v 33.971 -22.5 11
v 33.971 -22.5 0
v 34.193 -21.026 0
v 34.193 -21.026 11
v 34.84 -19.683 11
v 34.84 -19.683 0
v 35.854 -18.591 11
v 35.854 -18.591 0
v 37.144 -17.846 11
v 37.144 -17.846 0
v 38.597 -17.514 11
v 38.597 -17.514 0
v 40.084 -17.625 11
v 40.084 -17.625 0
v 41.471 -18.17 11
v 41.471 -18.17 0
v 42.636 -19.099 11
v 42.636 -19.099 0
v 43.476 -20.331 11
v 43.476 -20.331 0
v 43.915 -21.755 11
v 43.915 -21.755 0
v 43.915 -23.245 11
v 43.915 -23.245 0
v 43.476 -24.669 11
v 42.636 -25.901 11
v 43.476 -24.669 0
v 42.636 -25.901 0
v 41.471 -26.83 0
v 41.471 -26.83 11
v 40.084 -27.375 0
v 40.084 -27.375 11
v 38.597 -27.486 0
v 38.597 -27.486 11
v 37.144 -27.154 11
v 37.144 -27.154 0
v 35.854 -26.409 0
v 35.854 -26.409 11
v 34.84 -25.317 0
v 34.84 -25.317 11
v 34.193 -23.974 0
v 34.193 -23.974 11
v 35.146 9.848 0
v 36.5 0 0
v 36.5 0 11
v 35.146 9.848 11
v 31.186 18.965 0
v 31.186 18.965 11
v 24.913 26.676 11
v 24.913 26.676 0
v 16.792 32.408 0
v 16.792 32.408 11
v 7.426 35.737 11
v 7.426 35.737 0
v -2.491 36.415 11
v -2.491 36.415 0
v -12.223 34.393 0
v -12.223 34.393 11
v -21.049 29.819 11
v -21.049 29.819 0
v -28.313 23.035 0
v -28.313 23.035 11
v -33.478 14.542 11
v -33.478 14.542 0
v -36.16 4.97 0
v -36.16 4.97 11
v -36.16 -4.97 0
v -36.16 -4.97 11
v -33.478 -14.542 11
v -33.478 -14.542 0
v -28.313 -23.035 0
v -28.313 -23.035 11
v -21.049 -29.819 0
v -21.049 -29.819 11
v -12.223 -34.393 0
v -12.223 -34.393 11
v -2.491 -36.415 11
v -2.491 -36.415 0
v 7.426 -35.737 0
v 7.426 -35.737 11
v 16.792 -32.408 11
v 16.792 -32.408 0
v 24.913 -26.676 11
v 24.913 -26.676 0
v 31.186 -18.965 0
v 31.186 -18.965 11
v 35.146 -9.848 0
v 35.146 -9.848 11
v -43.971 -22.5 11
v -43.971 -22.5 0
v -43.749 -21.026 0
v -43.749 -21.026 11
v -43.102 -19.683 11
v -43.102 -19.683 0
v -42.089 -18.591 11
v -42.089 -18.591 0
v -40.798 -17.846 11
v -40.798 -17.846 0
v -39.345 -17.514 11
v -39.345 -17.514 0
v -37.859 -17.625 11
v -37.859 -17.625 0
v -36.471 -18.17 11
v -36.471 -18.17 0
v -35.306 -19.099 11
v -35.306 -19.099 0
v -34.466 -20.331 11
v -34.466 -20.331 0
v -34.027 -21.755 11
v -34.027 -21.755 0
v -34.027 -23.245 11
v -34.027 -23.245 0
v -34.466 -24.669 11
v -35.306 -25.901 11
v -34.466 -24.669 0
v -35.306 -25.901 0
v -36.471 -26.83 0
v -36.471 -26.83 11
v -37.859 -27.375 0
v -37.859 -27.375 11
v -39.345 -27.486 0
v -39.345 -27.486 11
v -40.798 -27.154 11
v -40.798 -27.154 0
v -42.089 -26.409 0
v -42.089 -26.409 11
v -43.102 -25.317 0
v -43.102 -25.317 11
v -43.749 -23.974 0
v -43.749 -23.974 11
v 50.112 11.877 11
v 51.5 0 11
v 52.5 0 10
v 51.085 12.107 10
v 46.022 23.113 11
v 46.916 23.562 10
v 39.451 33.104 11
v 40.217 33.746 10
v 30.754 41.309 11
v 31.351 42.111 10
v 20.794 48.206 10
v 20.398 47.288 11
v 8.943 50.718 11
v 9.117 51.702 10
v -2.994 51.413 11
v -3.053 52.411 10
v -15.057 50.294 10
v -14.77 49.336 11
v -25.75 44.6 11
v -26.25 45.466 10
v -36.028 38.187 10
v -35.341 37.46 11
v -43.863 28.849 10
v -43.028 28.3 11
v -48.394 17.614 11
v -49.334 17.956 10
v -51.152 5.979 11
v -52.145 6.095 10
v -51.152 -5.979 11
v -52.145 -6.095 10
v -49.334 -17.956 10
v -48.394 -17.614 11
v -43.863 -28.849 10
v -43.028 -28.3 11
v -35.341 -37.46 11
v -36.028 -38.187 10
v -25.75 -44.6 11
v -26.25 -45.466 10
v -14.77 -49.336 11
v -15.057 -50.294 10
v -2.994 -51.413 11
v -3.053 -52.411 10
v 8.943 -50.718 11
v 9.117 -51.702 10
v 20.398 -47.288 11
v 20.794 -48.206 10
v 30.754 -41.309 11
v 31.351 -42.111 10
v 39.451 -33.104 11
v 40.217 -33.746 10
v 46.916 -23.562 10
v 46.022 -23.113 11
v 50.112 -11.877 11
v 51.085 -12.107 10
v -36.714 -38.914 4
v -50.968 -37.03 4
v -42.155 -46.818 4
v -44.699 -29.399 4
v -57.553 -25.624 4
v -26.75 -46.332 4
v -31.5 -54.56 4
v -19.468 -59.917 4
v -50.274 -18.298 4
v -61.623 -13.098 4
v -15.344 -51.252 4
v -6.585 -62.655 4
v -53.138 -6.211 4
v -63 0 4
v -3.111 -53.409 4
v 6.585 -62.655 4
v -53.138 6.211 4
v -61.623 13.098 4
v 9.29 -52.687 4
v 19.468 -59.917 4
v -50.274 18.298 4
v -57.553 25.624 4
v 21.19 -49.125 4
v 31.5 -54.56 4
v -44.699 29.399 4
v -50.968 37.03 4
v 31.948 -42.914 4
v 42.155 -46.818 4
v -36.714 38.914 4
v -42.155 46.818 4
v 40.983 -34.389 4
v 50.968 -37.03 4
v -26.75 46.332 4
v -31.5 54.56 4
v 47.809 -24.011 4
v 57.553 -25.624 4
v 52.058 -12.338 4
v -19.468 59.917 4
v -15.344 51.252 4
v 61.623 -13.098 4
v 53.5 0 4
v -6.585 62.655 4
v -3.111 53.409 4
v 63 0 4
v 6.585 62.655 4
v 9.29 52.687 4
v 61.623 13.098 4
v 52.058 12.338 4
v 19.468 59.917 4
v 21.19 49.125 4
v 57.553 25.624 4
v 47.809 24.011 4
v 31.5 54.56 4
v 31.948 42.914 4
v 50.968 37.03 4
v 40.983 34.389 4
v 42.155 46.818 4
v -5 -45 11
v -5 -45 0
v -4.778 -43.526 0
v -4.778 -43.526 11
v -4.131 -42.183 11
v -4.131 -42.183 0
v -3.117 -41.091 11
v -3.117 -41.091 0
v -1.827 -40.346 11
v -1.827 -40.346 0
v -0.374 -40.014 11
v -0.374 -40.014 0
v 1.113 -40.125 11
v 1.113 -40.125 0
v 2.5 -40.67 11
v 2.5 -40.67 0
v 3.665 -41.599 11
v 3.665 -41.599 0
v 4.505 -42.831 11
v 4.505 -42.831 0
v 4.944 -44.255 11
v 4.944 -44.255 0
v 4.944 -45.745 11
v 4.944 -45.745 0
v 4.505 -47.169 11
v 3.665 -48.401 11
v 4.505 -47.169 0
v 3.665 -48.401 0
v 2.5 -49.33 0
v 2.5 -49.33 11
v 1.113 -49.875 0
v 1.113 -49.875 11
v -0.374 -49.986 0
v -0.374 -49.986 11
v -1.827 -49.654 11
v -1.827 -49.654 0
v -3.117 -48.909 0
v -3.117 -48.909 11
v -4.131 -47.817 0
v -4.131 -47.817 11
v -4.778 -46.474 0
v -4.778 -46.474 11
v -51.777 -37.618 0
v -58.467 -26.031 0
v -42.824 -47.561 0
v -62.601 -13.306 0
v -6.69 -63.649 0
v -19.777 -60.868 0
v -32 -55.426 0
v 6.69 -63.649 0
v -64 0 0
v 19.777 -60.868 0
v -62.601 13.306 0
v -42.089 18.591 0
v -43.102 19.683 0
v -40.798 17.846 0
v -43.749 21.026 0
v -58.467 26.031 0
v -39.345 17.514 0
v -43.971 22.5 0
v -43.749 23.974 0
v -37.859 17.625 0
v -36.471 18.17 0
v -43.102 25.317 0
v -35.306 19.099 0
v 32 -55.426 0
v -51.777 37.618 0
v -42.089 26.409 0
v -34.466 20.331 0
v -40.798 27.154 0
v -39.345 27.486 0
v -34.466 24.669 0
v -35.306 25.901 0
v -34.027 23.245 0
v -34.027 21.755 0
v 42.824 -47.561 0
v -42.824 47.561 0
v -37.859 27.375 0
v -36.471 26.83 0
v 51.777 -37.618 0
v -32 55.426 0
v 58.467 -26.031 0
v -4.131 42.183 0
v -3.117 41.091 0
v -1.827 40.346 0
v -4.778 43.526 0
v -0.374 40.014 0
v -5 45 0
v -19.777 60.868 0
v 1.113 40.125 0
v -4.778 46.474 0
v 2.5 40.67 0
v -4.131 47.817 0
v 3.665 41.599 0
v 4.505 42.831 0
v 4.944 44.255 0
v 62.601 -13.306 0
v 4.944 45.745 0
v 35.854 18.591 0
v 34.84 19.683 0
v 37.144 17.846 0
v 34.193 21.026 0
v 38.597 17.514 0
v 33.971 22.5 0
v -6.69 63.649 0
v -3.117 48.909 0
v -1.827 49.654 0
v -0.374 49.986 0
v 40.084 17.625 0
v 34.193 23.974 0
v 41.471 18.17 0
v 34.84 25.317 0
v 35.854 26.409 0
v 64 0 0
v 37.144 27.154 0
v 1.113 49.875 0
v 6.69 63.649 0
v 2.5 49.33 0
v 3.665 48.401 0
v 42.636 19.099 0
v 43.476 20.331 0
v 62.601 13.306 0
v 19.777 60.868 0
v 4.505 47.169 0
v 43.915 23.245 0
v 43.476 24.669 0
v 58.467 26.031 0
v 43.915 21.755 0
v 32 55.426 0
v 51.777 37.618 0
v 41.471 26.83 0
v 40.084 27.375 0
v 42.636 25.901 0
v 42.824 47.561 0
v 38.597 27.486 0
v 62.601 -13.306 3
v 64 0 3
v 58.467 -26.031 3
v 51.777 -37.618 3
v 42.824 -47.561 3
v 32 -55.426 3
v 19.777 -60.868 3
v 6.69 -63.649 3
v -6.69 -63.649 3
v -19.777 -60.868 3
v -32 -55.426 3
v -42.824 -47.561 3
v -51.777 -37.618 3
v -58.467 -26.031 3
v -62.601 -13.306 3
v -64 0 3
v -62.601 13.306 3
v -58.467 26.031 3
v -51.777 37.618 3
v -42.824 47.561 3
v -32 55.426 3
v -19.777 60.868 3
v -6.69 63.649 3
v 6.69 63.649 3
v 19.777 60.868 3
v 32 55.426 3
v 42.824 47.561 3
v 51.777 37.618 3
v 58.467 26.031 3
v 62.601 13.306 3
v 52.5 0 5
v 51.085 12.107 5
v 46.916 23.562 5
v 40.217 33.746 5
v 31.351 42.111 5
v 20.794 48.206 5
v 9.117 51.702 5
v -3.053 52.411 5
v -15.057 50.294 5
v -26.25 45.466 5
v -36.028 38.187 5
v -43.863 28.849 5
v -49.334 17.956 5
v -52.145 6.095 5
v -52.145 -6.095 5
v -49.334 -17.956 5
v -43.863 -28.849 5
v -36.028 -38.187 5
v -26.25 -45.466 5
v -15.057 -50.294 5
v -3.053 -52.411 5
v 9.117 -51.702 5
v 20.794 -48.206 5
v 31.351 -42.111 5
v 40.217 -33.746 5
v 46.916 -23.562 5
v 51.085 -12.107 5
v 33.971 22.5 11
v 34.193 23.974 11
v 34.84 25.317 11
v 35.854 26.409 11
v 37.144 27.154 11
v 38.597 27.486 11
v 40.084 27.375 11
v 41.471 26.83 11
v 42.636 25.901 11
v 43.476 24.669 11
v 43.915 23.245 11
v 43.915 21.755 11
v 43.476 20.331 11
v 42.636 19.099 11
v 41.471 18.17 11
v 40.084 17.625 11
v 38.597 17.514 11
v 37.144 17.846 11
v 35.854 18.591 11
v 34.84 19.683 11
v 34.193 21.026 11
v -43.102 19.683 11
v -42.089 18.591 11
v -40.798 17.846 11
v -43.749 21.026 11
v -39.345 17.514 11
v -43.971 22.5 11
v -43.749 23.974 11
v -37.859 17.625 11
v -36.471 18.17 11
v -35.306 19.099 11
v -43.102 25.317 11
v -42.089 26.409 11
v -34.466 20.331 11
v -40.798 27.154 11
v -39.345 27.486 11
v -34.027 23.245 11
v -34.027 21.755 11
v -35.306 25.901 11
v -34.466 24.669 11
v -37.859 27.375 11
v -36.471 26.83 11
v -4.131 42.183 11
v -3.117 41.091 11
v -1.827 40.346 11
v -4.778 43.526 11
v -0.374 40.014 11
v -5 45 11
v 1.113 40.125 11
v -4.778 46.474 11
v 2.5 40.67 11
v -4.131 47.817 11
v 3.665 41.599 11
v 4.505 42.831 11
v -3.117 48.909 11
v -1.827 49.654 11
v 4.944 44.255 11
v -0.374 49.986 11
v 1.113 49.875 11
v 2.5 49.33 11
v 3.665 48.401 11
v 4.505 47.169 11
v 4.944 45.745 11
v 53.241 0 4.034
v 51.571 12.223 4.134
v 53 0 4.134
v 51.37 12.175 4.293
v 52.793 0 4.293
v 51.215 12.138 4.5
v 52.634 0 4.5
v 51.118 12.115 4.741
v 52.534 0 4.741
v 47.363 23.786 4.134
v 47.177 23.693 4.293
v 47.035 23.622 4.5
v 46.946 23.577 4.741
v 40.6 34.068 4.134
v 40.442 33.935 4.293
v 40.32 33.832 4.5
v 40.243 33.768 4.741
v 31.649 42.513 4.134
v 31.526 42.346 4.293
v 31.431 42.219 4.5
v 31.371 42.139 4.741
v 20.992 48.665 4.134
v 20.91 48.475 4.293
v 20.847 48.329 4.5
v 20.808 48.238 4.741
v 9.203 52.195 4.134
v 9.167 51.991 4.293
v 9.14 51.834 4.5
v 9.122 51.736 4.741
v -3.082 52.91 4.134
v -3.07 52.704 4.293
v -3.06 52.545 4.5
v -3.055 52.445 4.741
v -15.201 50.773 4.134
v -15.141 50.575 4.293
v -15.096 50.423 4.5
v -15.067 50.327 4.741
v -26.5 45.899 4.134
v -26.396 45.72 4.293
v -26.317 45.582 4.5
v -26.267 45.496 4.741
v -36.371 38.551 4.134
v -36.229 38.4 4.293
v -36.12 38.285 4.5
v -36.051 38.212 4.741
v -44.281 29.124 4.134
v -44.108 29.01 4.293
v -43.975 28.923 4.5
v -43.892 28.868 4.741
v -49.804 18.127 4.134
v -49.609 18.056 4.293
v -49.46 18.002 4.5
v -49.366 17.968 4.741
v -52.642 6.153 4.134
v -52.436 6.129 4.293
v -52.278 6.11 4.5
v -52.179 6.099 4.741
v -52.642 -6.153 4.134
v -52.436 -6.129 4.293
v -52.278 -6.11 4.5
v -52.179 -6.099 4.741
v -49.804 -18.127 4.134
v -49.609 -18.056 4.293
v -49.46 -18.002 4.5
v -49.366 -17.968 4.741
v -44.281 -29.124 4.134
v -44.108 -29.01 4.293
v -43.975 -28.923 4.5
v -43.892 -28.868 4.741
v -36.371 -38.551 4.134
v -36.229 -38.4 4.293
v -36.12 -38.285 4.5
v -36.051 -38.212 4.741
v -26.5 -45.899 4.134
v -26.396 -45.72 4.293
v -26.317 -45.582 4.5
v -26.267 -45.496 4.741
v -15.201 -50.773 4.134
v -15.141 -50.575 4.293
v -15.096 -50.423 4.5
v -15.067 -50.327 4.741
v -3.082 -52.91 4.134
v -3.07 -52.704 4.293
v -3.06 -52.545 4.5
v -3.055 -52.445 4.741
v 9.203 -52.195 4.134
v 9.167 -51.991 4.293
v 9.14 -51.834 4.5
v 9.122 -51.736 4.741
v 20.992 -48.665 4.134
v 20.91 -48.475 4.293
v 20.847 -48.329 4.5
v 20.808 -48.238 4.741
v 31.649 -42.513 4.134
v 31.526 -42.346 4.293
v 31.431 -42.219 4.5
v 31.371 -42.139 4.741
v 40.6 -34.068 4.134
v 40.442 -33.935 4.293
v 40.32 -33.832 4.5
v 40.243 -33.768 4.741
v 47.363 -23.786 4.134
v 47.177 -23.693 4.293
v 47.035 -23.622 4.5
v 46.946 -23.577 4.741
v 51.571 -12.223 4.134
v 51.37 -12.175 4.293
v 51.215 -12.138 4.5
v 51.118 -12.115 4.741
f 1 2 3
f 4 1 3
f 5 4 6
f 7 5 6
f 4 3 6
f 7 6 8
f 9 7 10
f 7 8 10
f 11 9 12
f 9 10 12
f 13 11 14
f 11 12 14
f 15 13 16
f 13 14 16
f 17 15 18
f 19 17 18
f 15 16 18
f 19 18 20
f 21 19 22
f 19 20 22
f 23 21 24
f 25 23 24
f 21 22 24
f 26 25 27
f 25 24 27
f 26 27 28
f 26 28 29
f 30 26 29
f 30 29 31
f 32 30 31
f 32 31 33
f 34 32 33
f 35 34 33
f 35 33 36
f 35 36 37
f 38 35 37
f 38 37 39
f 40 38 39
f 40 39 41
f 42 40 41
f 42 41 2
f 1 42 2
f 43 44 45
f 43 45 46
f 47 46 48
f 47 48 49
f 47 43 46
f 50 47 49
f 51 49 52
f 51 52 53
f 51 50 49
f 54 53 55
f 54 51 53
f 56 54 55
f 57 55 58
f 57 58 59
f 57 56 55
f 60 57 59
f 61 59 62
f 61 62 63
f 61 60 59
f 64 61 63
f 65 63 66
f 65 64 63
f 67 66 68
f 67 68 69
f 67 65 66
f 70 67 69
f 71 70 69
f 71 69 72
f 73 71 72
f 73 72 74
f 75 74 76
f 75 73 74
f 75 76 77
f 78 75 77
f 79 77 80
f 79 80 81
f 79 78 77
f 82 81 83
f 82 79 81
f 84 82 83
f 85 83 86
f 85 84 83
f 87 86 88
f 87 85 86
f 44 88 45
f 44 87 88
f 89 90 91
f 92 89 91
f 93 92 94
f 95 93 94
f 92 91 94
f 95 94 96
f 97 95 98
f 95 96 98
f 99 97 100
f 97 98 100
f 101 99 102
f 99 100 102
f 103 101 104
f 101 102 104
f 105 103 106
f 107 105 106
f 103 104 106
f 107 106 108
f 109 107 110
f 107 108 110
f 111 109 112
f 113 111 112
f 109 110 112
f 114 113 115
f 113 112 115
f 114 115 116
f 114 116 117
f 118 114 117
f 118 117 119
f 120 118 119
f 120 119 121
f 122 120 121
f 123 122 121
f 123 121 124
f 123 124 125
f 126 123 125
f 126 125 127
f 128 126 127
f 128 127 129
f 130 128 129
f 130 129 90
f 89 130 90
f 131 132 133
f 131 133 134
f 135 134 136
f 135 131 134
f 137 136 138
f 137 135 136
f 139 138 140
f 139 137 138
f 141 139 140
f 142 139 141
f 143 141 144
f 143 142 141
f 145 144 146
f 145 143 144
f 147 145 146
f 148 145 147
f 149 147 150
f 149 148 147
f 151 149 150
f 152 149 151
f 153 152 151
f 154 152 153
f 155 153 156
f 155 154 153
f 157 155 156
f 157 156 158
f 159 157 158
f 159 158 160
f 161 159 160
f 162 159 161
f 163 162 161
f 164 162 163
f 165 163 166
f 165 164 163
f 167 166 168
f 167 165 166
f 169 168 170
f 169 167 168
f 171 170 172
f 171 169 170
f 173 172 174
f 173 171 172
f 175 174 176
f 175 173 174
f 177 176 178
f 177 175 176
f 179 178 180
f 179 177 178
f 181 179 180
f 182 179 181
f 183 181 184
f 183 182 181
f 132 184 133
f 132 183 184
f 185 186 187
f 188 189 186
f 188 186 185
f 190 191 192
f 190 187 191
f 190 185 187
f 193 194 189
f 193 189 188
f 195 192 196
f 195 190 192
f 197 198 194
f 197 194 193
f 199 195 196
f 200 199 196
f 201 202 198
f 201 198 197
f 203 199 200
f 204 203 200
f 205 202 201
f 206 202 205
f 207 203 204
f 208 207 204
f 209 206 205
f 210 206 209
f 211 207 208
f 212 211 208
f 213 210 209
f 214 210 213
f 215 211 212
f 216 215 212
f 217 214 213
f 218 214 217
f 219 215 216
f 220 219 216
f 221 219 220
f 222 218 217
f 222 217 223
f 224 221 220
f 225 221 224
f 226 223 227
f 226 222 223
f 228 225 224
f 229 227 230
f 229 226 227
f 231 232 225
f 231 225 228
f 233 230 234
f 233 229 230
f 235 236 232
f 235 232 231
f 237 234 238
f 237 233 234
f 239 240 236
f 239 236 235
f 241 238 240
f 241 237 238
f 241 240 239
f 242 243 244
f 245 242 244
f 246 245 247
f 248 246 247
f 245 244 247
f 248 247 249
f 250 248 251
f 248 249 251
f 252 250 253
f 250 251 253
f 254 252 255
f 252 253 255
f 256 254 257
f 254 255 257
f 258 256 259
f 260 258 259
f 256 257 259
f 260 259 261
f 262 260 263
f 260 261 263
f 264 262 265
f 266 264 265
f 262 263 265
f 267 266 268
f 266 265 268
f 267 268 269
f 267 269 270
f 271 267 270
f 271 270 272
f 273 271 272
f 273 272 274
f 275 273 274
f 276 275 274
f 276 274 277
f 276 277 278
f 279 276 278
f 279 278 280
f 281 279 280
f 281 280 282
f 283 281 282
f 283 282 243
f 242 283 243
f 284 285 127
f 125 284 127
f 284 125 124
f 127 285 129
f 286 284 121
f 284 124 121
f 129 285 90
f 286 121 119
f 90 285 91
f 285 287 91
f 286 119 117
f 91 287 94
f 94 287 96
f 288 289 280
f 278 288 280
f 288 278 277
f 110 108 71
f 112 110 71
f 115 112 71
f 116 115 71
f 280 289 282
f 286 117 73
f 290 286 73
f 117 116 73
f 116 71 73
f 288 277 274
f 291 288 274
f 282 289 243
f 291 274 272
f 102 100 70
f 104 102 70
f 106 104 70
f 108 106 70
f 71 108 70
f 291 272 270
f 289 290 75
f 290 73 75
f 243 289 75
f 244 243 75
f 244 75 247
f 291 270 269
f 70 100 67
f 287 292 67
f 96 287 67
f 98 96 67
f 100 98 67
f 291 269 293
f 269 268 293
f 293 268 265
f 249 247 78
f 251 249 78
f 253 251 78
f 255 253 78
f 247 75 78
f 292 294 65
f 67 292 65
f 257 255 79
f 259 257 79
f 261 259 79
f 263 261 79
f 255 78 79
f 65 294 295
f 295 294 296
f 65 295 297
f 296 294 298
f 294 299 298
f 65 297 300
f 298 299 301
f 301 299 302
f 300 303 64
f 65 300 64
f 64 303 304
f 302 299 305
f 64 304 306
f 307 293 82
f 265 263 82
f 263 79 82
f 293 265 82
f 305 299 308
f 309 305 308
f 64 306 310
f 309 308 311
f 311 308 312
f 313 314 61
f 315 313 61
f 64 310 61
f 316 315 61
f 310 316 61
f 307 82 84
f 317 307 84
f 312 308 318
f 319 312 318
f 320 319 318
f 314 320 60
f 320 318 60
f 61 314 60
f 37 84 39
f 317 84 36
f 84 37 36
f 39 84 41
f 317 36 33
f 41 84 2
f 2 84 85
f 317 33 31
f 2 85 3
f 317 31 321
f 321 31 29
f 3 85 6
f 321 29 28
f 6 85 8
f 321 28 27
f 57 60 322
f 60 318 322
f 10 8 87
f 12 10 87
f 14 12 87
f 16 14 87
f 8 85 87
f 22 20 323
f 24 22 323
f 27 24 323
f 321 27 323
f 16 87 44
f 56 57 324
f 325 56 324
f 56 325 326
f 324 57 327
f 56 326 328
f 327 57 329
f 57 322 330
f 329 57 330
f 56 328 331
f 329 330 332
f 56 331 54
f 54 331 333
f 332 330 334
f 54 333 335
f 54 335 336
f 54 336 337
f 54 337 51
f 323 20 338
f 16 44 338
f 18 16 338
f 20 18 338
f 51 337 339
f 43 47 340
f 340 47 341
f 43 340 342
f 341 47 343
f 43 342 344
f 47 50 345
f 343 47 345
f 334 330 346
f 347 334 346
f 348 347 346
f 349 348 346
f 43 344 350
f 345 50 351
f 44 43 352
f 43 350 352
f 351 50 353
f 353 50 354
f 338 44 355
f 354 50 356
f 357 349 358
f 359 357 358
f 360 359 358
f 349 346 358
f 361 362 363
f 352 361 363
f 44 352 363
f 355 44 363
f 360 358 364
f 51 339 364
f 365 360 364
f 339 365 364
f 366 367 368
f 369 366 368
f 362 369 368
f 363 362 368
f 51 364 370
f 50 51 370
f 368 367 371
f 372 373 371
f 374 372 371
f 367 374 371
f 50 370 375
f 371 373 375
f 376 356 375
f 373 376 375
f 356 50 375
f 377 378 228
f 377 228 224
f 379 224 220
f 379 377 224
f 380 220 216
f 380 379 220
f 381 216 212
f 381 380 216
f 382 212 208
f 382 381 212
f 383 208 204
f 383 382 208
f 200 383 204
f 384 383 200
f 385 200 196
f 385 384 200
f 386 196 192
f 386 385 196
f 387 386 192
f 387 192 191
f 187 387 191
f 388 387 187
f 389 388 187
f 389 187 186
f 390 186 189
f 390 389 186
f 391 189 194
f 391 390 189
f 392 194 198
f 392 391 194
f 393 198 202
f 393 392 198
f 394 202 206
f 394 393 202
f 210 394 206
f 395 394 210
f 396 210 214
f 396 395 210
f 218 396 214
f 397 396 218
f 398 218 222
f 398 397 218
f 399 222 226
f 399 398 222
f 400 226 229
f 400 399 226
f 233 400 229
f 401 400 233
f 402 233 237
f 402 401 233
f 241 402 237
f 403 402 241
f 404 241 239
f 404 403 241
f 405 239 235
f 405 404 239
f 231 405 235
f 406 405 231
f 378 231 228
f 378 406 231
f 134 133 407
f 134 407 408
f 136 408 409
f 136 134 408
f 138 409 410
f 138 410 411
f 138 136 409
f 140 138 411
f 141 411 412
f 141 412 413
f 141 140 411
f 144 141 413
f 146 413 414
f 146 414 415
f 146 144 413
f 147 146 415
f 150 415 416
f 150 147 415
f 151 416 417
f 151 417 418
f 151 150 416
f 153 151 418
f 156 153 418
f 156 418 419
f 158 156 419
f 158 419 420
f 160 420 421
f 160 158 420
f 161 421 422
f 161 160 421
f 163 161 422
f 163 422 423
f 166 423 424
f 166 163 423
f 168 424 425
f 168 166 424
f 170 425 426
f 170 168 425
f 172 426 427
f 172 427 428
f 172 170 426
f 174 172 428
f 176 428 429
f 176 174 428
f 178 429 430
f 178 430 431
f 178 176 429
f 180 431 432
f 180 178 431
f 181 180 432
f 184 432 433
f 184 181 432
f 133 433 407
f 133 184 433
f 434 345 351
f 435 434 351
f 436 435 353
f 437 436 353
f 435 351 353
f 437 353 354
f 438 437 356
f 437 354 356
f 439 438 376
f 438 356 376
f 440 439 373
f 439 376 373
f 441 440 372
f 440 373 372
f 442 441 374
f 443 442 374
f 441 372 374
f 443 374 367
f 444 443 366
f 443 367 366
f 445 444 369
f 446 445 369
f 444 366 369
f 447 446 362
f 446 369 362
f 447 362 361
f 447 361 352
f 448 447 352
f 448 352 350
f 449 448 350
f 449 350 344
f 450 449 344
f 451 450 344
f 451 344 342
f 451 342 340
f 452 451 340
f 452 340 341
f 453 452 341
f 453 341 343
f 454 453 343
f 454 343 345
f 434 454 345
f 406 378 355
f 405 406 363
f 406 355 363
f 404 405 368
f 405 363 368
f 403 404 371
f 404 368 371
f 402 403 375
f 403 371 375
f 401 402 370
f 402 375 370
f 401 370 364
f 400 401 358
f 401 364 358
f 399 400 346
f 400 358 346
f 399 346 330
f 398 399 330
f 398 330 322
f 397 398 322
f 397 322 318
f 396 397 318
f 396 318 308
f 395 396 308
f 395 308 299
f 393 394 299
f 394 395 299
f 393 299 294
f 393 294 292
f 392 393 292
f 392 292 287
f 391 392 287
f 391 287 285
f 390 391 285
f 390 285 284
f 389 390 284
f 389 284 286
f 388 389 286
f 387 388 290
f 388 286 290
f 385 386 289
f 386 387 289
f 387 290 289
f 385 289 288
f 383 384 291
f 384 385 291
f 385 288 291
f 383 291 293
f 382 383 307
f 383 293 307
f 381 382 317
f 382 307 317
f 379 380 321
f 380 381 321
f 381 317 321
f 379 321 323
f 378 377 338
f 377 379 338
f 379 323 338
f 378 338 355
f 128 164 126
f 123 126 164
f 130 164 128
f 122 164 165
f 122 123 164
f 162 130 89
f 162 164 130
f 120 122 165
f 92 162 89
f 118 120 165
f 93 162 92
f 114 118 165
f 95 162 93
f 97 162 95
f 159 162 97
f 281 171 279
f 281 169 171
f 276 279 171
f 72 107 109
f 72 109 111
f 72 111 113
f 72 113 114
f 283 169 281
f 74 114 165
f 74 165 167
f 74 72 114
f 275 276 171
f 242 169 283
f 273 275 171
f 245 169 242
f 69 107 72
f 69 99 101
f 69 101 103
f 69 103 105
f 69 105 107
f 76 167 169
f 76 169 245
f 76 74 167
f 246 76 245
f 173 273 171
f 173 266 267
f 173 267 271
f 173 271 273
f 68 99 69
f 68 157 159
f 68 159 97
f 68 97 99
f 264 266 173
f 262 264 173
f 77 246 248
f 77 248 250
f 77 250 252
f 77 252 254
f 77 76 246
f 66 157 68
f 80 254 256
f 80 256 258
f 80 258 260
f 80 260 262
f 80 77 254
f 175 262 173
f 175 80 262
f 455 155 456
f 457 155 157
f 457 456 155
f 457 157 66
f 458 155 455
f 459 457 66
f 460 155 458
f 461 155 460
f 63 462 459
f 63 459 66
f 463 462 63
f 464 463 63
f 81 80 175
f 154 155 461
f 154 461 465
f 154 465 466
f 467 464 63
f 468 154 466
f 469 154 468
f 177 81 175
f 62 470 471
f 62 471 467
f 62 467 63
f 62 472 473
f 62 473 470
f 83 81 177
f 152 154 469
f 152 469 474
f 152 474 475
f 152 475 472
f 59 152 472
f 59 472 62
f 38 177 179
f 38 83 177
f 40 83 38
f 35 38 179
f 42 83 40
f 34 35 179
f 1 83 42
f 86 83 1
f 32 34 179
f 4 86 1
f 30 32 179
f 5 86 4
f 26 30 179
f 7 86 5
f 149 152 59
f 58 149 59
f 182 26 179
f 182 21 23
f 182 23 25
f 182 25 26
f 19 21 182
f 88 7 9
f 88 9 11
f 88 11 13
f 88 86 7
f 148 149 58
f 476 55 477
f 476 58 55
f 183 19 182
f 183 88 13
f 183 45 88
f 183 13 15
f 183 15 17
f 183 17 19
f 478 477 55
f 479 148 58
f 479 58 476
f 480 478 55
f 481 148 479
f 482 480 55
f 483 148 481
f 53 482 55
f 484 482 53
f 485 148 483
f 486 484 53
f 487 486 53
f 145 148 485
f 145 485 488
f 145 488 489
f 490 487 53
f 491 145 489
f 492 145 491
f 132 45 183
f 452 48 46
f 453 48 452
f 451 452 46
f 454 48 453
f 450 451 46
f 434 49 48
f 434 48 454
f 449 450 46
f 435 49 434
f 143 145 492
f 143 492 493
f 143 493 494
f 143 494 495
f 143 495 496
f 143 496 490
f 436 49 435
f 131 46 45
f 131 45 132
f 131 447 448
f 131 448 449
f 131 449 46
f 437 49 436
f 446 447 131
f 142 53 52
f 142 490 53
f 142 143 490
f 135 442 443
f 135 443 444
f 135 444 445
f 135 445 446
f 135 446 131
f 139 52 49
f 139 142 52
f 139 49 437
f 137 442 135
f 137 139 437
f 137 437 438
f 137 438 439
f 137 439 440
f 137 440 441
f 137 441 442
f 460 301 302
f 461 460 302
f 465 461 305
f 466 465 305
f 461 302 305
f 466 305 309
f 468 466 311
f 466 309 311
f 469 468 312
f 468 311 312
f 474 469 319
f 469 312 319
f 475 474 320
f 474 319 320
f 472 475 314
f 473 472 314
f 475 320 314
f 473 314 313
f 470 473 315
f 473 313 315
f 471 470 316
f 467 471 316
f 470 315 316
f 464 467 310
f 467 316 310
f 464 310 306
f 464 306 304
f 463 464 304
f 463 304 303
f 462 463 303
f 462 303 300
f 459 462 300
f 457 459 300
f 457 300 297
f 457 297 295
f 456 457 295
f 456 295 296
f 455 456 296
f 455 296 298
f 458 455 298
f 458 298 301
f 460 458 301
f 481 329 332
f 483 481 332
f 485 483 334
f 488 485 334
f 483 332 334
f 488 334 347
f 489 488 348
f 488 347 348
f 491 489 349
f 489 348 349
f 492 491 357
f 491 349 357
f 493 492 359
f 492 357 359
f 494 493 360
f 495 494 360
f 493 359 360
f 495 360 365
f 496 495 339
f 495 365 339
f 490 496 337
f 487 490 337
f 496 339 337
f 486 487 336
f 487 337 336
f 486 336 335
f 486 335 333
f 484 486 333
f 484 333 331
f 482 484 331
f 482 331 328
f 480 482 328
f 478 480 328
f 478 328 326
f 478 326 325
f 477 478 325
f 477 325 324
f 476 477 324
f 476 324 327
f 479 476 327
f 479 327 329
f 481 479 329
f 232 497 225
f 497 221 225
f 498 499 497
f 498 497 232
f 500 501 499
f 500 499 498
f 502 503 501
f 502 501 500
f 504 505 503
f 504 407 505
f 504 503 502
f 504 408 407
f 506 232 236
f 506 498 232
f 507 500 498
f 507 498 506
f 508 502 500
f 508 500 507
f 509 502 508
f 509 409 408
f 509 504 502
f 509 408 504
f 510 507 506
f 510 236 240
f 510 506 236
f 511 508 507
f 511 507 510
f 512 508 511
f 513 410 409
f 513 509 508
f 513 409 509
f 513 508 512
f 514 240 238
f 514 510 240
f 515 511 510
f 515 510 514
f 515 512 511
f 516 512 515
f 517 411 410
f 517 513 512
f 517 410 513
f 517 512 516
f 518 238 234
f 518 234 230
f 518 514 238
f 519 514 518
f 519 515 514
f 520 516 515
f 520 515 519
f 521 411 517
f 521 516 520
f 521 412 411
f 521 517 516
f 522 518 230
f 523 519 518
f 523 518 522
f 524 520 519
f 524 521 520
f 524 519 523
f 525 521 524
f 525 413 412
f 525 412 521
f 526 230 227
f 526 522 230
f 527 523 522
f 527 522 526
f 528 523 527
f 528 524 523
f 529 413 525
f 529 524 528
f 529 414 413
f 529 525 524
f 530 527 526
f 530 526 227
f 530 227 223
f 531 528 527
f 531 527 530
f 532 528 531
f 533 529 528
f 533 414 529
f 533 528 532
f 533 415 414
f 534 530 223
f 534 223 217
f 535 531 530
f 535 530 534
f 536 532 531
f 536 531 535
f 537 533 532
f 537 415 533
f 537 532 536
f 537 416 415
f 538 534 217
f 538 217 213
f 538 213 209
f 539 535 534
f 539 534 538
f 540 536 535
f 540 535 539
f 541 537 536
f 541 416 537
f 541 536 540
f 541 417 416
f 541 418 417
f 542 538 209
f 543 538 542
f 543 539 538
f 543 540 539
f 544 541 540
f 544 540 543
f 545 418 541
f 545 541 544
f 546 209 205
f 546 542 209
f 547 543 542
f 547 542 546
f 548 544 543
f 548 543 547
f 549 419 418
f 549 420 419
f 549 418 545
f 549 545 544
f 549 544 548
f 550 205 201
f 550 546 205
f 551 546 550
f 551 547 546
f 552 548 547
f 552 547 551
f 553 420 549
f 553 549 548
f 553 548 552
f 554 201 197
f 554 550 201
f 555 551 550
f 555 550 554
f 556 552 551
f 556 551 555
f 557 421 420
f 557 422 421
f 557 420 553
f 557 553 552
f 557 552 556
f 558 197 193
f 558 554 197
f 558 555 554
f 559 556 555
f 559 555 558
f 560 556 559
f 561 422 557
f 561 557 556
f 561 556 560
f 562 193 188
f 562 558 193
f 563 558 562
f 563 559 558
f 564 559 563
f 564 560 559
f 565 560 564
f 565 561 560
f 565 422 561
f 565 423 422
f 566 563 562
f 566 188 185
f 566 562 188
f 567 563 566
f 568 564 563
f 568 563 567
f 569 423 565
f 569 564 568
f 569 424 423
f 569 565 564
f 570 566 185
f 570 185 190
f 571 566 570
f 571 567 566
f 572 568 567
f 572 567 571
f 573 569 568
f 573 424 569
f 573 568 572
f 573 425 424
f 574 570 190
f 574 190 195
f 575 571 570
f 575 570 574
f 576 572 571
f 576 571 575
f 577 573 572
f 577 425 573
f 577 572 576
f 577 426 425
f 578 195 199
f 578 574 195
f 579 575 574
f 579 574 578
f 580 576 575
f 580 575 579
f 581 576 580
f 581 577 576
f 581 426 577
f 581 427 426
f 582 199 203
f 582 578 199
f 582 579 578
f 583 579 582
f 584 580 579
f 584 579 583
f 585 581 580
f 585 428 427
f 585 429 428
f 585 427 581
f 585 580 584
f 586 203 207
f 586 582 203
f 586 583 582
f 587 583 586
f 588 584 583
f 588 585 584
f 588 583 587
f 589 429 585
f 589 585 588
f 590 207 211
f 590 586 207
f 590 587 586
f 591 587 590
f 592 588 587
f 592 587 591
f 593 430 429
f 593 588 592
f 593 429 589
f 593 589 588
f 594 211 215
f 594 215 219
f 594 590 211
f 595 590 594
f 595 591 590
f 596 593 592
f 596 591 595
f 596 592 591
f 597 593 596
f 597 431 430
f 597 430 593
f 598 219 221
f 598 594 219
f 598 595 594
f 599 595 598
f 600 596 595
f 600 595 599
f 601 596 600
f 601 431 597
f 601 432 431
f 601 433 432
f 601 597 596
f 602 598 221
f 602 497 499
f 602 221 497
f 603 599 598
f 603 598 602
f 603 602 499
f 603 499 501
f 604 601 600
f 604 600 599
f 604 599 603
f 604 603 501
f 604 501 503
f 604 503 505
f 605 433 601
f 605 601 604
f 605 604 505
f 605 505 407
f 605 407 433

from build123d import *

# Parameters (mm, degrees)
IZIM1_R                     = 64
IZIM1_R_2                   = 36.5
Y_KSEKLIK_EKSTR_ZYON1_DEPTH = 11
IZIM2_R                     = 79.958425649
IZIM2_R_2                   = 52.5
KES_EKSTR_ZYON1_DEPTH       = 7
RADYUS1_R                   = 1
PAH1_SIZE                   = 1
IZIM3_R                     = 5
KES_EKSTR_ZYON2_DEPTH       = 60


with BuildPart() as part:
    # Çizim1 → Yükseklik-Ekstrüzyon1 (new body)
    with BuildSketch(Plane.XY):
        Circle(IZIM1_R)
        Circle(IZIM1_R_2, mode=Mode.SUBTRACT)
    extrude(amount=Y_KSEKLIK_EKSTR_ZYON1_DEPTH)

    # Çizim2 → Kes-Ekstrüzyon1 (cut)
    with BuildSketch(Plane.XY.offset(11)):
        Circle(IZIM2_R)
        Circle(IZIM2_R_2, mode=Mode.SUBTRACT)
    extrude(amount=-KES_EKSTR_ZYON1_DEPTH, mode=Mode.SUBTRACT)

    # Radyus1
    radyus1_edges = [part.edges().sort_by_distance(p)[0] for p in [
        (-52.5, 0, 4),
    ]]
    fillet(radyus1_edges, radius=RADYUS1_R)

    # Pah1
    pah1_edges = [part.edges().sort_by_distance(p)[0] for p in [
        (-64, 0, 4),
        (-52.5, 0, 11),
    ]]
    chamfer(pah1_edges, length=PAH1_SIZE)

    # Çizim3 → Kes-Ekstrüzyon2 (cut)
    with BuildSketch(Plane(origin=(0, 0, 0), x_dir=(-1, 0, 0), z_dir=(0, 0, -1))):
        with Locations((0, 45)):
            Circle(IZIM3_R)
        with Locations((38.97114317, 22.5)):
            Circle(IZIM3_R)
        with Locations((38.97114317, -22.5)):
            Circle(IZIM3_R)
        with Locations((0, -45)):
            Circle(IZIM3_R)
        with Locations((-38.97114317, -22.5)):
            Circle(IZIM3_R)
        with Locations((-38.97114317, 22.5)):
            Circle(IZIM3_R)
    extrude(amount=-KES_EKSTR_ZYON2_DEPTH, mode=Mode.SUBTRACT)


solid = part.part
